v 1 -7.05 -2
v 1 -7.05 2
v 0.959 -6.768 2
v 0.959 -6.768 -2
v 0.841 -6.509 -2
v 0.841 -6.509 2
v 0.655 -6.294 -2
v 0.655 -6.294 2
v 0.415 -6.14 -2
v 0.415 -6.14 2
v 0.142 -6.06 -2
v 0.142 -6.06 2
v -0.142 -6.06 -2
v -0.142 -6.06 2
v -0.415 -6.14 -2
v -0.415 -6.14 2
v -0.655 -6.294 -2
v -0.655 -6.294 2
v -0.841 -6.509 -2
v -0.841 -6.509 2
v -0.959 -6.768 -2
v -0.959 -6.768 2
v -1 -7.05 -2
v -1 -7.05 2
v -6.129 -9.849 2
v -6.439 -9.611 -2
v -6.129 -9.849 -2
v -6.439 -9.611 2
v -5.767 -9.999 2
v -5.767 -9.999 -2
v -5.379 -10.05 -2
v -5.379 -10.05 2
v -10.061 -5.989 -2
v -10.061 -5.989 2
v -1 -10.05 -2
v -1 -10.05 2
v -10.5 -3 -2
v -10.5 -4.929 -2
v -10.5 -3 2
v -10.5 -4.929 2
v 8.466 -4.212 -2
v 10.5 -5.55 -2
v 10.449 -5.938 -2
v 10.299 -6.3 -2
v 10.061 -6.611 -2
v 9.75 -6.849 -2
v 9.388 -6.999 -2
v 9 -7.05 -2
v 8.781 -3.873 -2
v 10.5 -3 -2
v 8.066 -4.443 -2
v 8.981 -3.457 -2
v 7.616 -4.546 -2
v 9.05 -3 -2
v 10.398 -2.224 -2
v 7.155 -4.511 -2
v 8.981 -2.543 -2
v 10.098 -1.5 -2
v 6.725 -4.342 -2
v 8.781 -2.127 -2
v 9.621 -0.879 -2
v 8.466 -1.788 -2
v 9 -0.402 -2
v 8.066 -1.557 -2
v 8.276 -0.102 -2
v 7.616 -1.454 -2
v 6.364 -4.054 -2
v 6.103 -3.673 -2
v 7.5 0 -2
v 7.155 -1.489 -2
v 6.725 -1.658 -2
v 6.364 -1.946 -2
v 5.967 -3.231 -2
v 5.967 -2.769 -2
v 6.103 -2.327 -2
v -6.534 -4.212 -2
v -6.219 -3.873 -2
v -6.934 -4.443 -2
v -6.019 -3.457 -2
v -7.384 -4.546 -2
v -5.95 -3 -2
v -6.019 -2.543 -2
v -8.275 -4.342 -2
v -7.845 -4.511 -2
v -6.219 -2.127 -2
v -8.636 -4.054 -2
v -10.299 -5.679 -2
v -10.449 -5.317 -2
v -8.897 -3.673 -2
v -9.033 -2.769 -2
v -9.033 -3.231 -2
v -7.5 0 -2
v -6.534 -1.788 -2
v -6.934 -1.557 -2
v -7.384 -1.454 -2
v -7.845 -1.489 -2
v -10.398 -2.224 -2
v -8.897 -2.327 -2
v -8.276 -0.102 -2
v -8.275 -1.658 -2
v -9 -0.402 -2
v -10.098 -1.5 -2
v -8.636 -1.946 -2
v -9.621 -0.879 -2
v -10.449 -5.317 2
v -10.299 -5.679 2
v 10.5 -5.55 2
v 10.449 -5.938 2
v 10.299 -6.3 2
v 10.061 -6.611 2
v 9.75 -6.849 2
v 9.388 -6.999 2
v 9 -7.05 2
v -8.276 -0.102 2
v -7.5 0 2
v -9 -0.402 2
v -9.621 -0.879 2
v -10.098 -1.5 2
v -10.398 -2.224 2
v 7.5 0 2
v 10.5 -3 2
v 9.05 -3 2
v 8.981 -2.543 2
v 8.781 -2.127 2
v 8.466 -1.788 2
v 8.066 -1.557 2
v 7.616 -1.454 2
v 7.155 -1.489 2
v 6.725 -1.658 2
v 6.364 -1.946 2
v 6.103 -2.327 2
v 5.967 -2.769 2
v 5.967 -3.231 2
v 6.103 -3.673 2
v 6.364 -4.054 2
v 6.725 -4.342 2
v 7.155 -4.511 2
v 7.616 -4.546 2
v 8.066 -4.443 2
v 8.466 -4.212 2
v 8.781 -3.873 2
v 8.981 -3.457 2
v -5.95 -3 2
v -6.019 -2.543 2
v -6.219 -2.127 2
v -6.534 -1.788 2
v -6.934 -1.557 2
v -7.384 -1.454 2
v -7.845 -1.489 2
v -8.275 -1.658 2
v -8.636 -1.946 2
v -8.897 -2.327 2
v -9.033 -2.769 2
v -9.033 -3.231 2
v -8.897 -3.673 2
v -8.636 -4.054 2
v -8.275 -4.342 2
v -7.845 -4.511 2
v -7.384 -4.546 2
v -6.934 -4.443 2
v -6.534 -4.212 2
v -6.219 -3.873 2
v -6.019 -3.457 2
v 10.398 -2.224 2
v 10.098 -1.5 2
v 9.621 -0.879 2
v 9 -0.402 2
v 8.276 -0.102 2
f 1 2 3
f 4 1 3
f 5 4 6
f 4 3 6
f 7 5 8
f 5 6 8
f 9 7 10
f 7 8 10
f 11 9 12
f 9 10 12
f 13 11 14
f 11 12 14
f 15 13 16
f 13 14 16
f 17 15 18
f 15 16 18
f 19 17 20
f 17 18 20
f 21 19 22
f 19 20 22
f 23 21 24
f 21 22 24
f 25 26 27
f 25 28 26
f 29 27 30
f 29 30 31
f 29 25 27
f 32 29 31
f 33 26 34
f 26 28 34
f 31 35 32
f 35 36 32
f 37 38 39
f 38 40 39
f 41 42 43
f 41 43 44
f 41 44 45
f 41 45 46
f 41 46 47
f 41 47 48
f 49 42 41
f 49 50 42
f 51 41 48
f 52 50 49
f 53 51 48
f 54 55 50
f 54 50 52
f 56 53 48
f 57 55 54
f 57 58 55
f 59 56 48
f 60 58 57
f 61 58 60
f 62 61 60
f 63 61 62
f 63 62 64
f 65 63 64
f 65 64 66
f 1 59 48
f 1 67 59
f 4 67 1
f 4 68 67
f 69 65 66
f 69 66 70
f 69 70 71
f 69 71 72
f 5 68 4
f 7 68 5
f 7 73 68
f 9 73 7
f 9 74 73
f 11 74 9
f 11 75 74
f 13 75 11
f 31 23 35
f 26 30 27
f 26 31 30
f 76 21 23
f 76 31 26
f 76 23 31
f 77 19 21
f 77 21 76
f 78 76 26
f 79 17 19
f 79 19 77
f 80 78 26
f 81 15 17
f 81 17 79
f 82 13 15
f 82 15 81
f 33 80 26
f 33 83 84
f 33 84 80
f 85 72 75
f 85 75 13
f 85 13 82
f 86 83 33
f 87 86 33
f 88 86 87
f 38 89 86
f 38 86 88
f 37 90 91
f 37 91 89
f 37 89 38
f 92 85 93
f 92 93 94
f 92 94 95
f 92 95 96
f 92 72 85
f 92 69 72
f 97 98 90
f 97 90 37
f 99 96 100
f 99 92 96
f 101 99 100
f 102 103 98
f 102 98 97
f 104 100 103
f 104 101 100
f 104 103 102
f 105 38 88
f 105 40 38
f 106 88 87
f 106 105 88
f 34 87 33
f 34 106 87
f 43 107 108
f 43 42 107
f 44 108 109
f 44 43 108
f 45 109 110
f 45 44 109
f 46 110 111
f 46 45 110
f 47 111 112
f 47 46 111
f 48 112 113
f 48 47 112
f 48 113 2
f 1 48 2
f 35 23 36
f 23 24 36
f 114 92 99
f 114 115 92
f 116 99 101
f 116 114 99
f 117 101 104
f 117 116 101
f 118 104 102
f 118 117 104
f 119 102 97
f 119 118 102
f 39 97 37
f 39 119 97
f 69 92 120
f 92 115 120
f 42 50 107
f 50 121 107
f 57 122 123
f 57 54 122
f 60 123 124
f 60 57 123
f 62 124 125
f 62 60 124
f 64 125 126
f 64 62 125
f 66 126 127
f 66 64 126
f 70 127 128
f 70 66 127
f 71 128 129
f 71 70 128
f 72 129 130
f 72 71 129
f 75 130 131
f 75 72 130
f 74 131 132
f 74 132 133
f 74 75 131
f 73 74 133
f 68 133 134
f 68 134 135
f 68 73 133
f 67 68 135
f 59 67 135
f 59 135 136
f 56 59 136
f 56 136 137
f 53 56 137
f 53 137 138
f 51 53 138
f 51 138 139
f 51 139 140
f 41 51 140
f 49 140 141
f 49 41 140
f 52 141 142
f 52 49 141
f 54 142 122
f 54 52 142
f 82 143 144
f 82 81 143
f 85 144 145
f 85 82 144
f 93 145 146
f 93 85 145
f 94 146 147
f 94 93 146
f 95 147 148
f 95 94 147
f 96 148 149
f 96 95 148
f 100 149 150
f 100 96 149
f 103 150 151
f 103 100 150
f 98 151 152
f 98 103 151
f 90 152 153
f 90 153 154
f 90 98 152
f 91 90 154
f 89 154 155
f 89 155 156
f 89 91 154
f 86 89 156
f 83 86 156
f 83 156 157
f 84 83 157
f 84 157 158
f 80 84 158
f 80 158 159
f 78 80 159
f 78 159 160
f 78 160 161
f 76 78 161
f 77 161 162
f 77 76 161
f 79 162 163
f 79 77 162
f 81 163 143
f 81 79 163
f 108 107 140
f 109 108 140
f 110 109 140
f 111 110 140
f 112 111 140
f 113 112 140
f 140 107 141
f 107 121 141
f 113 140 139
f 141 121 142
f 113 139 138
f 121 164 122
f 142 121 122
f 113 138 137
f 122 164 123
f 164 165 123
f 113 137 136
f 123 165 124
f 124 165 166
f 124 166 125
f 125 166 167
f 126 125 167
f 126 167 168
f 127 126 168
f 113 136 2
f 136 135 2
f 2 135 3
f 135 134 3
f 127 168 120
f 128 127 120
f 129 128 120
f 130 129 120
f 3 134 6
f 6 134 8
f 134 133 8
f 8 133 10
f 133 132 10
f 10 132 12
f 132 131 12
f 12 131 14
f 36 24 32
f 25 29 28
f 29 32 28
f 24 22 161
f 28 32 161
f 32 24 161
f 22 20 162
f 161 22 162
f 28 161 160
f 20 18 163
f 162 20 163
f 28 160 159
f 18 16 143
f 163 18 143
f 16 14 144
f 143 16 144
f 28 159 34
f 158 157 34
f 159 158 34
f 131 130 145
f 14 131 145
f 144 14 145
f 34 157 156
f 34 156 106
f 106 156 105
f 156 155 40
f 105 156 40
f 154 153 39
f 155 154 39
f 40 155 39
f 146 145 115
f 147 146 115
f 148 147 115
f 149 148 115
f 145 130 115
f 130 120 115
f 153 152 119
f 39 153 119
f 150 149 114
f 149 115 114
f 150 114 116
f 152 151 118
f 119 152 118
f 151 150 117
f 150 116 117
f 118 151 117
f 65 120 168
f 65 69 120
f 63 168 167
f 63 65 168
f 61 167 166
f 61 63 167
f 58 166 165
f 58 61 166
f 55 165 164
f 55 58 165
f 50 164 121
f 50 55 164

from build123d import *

# Parameters (mm, degrees)
SKETCH_1_R          = 1.55
EXTRUDE_1_DEPTH     = 2
FILLET_1_R          = 3
FILLET_2_R          = 1.5
SKETCH_3_R          = 1
CUT_EXTRUDE_1_DEPTH = 5


with BuildPart() as part:
    # 草图1 → 凸台-拉伸1 (new body, symmetric)
    with BuildSketch(Plane.XY):
        Polygon((-10.5, 0), (10.5, 0), (10.5, -7.05), (-1, -7.05), (-1, -10.05), (-6, -10.05), (-10.5, -5.55), align=None)
        with Locations((-7.5, -3)):
            Circle(SKETCH_1_R, mode=Mode.SUBTRACT)
        with Locations((7.5, -3)):
            Circle(SKETCH_1_R, mode=Mode.SUBTRACT)
    extrude(amount=EXTRUDE_1_DEPTH, both=True)

    # 圆角1
    fillet_1_edges = [part.edges().sort_by_distance(p)[0] for p in [
        (-10.5, 0, 0),
        (10.5, 0, 0),
    ]]
    fillet(fillet_1_edges, radius=FILLET_1_R)

    # 圆角2
    fillet_2_edges = [part.edges().sort_by_distance(p)[0] for p in [
        (10.5, -7.05, 0),
        (-6, -10.05, 0),
        (-10.5, -5.55, 0),
    ]]
    fillet(fillet_2_edges, radius=FILLET_2_R)

    # 草图3 → 切除-拉伸1 (cut, through all)
    with BuildSketch(Plane.XY.offset(2)):
        with Locations((0, -7.05)):
            Circle(SKETCH_3_R)
    extrude(amount=-CUT_EXTRUDE_1_DEPTH, mode=Mode.SUBTRACT)


solid = part.part
